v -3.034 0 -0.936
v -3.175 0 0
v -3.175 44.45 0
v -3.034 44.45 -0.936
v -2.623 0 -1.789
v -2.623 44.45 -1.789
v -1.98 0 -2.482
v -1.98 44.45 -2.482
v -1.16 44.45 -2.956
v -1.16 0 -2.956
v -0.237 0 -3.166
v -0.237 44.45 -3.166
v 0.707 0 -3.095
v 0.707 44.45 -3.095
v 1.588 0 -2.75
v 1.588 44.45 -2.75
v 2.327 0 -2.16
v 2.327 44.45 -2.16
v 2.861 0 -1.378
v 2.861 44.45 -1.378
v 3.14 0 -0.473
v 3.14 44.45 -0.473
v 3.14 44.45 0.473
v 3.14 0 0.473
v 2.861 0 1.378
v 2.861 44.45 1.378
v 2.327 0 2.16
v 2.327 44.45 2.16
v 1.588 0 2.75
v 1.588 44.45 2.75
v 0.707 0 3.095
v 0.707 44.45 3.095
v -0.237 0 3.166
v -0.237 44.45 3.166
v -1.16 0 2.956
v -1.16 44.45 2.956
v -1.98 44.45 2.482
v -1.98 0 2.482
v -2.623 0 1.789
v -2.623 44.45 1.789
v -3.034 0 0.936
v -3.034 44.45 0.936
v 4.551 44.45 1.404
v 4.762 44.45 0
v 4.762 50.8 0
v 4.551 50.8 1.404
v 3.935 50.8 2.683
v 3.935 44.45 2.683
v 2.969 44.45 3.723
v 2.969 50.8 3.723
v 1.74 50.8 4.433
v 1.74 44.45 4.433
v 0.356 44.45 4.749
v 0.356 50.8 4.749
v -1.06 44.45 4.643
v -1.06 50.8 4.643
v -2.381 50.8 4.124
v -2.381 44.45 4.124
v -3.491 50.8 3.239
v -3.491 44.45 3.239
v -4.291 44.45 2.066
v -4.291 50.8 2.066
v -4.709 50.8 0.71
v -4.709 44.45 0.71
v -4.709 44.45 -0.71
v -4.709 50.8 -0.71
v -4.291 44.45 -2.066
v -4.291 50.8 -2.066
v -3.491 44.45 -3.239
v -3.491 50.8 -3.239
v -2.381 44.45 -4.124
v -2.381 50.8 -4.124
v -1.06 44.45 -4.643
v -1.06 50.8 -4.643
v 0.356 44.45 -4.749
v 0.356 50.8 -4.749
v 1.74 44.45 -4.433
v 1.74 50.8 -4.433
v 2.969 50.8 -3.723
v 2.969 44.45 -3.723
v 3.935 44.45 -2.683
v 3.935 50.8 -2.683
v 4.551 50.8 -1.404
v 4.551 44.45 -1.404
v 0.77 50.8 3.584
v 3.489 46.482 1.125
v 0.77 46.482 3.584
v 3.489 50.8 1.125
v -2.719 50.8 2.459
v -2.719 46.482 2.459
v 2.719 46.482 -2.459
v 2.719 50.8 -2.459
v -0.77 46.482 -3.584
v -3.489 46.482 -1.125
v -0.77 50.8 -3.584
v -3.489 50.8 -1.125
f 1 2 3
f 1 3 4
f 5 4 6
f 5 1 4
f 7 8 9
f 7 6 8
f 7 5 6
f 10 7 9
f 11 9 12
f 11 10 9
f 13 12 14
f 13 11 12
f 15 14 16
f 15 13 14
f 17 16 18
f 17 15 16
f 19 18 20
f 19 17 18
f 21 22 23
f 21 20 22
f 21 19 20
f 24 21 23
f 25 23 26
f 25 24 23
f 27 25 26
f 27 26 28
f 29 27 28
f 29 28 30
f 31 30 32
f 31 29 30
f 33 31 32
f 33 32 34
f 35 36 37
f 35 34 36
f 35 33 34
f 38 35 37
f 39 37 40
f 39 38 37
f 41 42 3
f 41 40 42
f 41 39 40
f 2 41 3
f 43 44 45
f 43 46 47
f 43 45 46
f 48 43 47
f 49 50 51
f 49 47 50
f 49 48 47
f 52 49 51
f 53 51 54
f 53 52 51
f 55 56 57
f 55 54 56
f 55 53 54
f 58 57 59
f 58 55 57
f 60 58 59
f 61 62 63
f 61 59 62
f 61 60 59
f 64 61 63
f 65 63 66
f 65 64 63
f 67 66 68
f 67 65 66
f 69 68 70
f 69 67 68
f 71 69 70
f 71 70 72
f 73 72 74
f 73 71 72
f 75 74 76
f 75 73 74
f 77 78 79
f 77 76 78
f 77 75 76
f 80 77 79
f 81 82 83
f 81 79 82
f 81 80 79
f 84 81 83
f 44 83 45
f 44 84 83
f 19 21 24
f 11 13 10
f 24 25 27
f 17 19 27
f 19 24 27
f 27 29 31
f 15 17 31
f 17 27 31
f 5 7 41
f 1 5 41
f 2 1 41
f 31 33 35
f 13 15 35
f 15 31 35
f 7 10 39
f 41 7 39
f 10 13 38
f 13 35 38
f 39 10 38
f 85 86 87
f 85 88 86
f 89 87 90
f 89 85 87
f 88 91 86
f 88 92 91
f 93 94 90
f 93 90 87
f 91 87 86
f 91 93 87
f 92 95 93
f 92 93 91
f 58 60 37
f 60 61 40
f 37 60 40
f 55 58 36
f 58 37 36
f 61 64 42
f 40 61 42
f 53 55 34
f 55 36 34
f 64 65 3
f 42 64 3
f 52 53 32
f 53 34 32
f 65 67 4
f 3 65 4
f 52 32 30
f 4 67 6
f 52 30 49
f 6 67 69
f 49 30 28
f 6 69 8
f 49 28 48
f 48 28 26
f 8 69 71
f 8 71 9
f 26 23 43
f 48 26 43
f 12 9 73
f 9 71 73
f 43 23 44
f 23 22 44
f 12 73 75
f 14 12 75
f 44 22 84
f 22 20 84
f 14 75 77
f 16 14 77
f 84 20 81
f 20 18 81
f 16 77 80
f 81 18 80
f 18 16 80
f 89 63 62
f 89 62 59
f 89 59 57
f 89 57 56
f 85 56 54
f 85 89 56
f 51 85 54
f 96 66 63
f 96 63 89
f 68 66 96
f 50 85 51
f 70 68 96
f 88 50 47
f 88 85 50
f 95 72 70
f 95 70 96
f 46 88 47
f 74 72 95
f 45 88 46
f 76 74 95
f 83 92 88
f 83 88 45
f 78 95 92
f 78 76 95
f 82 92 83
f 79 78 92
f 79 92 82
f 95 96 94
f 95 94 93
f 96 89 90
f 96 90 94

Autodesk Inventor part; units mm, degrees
ref_plane "YZ Plane" through (0, 0, 0) normal (1, 0, 0) x (0, 1, 0)
ref_plane "XZ Plane" through (0, 0, 0) normal (0, 1, 0) x (-1, 0, 0)
ref_plane "XY Plane" through (0, 0, 0) normal (0, 0, 1) x (1, 0, 0)
sketch "Sketch1" plane through (0, 0, 0) normal (0, 1, 0) x (-1, 0, 0)
  circle A0 centre (0, 0) radius 3.175
  dimension "d2" = 6.35
extrude "Extrusion1" add sketch "Sketch1" along normal blind 44.45
thread "Thread1" size "1/4-20 UNC" class "2A" standard "ANSI Unified Screw Threads" full length
sketch "Sketch2" plane through (0, 44.45, 0) normal (0, 1, 0) x (1, 0, 0)
  circle A0 centre (0, 0) radius 4.7625
  dimension "d7" = 9.525
extrude "Extrusion2" add sketch "Sketch2" along normal blind 6.35
sketch "Sketch3" plane through (0, 50.8, 0) normal (0, 1, 0) x (1, 0, 0)
  line L0 (2.719, 2.4592) -> (3.4893, -1.1251)
  line L1 (3.4893, -1.1251) -> (0.7703, -3.5843)
  line L2 (0.7703, -3.5843) -> (-2.719, -2.4592)
  line L3 (-2.719, -2.4592) -> (-3.4893, 1.1251)
  line L4 (-3.4893, 1.1251) -> (-0.7703, 3.5843)
  line L5 (-0.7703, 3.5843) -> (2.719, 2.4592)
  point P0 (0, 0)
  point P1 (0, 0)
  dimension "d10" = 6.35
extrude "Extrusion3" cut sketch "Sketch3" against normal blind 4.318
properties part number "qtr20_75"
